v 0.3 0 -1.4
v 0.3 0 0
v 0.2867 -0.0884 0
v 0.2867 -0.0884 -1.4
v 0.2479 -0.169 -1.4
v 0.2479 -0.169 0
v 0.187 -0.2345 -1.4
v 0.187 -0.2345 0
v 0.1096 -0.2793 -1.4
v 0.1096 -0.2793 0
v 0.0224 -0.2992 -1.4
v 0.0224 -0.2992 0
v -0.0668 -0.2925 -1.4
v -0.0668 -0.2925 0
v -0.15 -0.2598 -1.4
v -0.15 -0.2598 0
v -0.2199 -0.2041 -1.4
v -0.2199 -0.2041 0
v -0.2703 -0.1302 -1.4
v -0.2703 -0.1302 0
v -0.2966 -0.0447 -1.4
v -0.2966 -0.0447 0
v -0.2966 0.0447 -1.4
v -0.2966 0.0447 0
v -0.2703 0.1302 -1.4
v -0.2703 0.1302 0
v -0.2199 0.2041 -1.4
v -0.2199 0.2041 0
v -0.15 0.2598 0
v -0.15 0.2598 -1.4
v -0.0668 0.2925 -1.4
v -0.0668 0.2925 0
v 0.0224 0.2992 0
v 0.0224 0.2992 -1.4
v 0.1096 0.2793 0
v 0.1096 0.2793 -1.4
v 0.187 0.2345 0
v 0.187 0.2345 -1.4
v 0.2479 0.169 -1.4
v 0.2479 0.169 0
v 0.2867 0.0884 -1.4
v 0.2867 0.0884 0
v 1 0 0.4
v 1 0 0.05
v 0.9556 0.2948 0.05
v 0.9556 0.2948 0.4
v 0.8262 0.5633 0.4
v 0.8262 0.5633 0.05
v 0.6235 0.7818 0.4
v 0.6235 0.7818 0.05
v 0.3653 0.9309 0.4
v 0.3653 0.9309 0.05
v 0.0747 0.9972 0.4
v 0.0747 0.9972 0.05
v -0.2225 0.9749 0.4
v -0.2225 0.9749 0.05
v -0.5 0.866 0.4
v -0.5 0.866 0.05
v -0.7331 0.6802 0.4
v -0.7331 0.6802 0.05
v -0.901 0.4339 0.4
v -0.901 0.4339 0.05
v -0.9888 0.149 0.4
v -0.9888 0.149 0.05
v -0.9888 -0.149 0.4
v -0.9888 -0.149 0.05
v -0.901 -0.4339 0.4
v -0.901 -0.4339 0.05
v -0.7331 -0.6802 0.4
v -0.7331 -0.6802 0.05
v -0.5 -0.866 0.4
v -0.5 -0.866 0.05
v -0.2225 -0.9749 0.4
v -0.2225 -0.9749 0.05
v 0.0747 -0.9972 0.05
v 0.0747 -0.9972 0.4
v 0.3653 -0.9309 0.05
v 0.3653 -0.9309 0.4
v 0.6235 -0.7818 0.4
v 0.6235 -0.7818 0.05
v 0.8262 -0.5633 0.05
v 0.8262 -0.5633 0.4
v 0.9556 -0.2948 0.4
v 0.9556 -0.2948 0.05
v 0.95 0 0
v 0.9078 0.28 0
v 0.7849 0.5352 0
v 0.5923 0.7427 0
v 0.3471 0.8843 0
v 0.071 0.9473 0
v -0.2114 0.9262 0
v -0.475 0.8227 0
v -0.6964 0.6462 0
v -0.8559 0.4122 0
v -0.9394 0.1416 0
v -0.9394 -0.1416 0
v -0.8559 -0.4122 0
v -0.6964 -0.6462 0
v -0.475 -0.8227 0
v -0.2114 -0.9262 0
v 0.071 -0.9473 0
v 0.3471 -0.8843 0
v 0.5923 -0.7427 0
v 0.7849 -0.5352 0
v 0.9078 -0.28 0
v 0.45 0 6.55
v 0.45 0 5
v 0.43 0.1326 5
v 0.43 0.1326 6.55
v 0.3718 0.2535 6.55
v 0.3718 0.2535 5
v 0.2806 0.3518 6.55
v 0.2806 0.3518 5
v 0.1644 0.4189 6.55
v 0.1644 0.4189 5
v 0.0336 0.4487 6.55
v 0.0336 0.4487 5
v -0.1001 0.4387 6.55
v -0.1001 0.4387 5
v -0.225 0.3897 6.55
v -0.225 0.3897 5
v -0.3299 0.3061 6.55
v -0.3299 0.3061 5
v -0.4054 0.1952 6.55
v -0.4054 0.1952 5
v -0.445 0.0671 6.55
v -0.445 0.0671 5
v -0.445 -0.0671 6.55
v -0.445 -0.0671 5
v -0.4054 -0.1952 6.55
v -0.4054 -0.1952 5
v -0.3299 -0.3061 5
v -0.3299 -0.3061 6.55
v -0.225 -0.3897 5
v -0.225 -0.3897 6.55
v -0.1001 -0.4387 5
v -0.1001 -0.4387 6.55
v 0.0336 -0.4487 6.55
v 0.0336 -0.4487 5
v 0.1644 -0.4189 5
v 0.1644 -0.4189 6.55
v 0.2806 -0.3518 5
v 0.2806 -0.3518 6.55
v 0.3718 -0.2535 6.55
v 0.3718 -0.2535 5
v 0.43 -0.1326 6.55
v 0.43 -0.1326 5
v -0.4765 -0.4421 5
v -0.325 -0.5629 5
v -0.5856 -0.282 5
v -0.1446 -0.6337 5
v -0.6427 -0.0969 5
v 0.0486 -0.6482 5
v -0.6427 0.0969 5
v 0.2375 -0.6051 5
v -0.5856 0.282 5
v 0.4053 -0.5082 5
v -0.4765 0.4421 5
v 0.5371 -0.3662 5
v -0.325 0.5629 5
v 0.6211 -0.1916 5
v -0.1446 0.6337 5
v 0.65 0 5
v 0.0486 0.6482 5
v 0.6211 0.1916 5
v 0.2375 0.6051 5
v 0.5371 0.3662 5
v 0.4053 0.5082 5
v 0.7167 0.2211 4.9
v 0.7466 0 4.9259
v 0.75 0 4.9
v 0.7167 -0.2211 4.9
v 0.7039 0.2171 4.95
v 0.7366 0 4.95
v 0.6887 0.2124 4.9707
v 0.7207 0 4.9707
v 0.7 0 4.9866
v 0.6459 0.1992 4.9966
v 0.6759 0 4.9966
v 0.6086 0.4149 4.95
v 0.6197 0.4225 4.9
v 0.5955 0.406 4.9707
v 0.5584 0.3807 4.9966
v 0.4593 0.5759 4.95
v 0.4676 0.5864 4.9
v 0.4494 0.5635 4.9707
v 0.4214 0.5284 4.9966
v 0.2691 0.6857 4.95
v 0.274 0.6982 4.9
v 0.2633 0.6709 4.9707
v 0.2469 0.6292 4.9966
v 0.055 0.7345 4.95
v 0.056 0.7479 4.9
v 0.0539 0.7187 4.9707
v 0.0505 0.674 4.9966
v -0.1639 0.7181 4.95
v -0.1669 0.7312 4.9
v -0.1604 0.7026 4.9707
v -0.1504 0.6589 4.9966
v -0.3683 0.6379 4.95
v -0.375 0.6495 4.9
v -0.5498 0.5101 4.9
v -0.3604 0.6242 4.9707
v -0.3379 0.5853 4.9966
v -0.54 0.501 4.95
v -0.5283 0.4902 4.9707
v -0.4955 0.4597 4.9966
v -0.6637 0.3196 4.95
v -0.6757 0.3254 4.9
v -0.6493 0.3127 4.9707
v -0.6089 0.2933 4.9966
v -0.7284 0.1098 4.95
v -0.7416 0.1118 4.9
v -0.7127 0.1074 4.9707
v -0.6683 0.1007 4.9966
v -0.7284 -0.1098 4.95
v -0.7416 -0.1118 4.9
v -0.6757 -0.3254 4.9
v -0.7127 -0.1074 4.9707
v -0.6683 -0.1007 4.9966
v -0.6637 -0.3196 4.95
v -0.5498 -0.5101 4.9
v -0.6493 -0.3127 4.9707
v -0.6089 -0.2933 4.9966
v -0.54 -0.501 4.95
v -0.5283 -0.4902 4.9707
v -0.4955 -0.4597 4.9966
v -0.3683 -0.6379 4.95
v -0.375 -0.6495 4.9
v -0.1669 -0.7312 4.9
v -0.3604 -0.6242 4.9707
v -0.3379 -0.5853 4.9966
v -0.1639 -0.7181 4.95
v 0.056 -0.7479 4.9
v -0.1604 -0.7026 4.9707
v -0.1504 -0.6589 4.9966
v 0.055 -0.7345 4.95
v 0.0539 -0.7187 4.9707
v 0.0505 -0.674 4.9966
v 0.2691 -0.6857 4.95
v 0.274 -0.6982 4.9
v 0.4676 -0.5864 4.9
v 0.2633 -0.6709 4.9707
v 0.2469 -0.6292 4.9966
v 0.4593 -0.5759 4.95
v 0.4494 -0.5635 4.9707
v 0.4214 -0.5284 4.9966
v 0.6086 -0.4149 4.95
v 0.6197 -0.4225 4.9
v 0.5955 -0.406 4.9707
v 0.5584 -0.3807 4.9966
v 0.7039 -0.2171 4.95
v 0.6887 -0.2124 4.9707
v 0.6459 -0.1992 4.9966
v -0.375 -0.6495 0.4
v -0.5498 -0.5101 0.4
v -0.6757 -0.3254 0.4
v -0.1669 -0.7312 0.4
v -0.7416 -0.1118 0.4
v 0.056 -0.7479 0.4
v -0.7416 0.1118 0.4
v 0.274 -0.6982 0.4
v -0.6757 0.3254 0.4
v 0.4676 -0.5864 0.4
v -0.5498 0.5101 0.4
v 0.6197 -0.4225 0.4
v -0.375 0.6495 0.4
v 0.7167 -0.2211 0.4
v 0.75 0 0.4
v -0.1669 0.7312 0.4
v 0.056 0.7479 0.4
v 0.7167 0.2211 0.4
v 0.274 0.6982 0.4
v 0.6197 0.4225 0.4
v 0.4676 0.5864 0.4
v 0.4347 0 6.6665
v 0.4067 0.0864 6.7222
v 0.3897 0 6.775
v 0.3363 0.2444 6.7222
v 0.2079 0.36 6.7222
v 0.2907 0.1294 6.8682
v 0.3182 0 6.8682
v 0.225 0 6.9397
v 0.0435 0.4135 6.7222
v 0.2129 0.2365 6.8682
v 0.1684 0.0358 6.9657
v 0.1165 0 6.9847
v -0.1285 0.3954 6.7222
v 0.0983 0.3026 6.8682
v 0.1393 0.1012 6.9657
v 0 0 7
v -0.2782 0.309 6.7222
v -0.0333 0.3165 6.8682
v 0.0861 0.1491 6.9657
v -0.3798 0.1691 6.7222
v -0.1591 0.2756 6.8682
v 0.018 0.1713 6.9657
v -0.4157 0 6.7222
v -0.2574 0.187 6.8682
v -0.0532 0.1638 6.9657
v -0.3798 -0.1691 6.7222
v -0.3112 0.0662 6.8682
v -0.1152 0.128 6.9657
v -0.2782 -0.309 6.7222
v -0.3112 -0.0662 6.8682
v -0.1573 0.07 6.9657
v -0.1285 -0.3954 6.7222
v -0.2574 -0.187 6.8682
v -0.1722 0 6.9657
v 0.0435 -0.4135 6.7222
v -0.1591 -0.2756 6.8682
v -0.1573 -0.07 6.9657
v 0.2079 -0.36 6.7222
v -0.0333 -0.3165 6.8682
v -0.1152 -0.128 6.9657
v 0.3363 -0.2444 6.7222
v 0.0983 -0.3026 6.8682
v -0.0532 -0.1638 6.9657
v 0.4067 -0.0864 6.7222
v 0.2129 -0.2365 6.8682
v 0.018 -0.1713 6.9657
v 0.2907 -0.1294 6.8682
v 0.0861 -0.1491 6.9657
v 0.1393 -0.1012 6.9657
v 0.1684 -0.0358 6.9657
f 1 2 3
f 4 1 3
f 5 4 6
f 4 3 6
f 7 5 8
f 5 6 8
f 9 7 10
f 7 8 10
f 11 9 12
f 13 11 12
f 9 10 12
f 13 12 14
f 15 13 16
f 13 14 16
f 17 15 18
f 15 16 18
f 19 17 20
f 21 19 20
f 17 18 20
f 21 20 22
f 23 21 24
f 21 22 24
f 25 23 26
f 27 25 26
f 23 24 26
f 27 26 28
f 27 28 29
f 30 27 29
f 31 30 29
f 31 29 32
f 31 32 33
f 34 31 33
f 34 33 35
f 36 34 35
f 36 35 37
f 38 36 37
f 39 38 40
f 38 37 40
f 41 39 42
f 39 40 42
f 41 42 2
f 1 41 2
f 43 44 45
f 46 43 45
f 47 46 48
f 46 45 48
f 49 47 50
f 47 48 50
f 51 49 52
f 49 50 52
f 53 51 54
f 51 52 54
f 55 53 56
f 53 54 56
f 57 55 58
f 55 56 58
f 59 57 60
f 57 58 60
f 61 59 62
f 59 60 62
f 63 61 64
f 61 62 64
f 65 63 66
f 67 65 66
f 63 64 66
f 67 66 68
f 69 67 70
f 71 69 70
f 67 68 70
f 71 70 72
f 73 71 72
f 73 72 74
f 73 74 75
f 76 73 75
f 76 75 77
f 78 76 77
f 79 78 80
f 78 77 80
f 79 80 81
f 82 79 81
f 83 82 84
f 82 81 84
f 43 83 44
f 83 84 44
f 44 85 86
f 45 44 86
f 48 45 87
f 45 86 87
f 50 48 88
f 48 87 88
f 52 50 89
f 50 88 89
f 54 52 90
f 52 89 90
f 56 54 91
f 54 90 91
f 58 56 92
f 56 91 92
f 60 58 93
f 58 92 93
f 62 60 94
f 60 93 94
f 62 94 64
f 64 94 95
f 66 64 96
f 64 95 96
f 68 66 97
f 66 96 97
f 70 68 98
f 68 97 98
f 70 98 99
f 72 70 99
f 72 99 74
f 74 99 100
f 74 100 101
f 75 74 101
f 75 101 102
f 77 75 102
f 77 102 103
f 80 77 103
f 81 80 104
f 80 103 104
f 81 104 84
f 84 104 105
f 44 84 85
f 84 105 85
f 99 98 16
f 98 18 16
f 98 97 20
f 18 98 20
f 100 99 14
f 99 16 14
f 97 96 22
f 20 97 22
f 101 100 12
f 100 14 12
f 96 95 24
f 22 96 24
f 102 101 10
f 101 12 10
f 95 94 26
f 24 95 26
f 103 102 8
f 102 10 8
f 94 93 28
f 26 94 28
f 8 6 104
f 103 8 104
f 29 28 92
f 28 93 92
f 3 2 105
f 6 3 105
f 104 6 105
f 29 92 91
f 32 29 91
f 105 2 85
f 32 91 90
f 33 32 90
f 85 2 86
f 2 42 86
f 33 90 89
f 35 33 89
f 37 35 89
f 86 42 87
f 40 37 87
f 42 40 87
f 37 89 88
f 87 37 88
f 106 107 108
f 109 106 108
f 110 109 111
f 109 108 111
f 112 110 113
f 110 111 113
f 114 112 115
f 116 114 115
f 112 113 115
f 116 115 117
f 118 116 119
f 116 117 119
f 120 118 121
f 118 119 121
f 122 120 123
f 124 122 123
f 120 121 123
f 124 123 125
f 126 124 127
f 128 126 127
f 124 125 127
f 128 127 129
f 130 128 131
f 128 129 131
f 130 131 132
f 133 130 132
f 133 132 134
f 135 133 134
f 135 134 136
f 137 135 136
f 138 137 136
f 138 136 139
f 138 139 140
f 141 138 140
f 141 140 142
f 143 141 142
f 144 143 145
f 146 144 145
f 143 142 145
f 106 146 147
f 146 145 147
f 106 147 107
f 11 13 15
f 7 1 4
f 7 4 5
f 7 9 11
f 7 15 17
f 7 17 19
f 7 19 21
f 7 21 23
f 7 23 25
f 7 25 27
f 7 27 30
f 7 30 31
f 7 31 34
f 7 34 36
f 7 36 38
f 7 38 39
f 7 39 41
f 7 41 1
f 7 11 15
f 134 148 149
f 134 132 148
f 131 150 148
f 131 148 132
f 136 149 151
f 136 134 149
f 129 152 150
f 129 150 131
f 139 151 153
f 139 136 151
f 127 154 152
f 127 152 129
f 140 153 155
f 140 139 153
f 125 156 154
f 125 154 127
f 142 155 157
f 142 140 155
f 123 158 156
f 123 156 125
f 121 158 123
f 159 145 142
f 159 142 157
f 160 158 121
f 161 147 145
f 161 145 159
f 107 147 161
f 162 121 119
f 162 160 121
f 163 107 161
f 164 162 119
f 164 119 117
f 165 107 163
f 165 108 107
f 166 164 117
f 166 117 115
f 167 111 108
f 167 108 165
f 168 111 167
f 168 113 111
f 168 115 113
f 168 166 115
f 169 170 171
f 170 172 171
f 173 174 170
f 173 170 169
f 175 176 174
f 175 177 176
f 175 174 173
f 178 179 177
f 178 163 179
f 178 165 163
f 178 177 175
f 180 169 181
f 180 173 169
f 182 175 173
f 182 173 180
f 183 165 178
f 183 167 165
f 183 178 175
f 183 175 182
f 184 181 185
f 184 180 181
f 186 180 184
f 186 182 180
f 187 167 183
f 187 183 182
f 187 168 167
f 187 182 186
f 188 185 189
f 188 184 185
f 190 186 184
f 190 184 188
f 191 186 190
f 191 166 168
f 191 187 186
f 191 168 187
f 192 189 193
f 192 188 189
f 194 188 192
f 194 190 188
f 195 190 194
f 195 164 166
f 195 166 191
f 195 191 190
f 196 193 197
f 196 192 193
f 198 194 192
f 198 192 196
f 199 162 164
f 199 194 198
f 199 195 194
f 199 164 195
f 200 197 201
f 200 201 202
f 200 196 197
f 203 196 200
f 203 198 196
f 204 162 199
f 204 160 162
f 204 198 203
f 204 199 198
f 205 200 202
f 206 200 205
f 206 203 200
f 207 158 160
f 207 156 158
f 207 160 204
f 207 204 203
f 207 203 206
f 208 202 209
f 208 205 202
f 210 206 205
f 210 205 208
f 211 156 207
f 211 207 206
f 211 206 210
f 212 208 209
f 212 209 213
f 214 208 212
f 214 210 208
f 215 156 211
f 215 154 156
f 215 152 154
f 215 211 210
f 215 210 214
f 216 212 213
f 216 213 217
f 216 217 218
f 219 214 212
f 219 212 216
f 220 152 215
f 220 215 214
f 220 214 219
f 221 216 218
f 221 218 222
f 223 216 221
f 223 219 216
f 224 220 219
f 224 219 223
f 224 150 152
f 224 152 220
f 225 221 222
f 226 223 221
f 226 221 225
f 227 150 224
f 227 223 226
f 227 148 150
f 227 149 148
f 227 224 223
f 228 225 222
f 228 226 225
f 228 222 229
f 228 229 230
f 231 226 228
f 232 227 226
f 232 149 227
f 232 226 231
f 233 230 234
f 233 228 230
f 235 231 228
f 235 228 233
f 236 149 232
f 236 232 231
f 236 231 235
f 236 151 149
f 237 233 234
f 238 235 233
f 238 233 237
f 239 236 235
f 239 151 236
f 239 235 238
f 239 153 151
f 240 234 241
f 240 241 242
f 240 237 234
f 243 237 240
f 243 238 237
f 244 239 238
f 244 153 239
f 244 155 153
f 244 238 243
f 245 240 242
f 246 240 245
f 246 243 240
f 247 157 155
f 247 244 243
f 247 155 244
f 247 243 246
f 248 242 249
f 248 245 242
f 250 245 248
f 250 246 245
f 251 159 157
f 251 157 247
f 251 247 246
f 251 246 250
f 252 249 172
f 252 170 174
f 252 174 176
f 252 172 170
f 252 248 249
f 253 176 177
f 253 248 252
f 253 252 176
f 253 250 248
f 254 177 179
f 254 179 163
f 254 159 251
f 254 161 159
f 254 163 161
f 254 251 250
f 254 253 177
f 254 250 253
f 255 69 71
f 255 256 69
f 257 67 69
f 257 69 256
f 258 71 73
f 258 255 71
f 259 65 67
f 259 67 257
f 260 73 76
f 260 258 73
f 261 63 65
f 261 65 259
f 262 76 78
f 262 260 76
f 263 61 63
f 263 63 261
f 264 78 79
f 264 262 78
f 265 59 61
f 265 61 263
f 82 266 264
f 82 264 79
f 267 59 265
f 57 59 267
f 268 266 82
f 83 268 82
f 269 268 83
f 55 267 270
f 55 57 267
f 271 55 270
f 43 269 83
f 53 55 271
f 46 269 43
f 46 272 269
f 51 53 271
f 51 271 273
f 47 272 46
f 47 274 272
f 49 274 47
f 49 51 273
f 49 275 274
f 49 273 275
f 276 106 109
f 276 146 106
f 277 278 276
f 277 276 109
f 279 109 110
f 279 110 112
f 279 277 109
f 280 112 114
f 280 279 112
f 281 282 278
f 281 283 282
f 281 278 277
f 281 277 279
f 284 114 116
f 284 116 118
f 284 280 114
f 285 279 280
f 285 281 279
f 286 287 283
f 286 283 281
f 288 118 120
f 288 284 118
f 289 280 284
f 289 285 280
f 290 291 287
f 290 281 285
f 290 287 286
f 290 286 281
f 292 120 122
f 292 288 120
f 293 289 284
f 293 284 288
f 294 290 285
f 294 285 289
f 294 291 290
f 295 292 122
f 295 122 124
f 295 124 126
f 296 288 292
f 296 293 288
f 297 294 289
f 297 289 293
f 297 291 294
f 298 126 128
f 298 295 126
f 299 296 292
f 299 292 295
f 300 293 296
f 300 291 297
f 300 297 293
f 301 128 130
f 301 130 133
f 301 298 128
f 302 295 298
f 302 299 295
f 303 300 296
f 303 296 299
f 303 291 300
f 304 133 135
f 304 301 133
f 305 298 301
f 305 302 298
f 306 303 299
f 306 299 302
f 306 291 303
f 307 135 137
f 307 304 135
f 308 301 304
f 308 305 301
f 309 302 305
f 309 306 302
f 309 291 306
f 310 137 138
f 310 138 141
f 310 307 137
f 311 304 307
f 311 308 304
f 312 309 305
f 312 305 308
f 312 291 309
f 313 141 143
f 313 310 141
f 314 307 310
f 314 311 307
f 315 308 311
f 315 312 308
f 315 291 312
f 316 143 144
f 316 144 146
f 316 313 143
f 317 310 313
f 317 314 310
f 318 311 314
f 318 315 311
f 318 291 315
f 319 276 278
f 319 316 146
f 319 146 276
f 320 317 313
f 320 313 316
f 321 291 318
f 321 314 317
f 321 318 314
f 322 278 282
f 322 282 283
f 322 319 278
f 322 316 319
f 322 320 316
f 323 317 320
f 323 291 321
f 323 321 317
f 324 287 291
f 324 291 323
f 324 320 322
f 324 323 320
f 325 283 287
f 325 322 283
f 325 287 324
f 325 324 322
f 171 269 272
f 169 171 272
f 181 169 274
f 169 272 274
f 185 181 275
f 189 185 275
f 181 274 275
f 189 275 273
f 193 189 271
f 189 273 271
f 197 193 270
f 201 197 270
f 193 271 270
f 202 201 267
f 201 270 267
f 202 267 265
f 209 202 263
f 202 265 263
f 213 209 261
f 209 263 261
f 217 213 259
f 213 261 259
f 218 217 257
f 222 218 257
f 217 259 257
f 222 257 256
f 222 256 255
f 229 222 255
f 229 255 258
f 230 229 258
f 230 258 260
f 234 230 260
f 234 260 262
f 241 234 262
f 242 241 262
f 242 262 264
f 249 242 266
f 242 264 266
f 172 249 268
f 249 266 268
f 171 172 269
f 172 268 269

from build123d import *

# Parameters (mm, degrees)
SKETCH_R     = 1
PAD_DEPTH    = 0.4
SKETCH001_R  = 0.75
PAD001_DEPTH = 4.6
SKETCH002_R  = 0.45
PAD002_DEPTH = 2
SKETCH003_R  = 0.3
PAD003_DEPTH = 1.4
CHAMFER_SIZE = 0.05
FILLET_R     = 0.1
FILLET001_R  = 0.45


with BuildPart() as part:
    # Sketch → Pad (new body)
    with BuildSketch(Plane.XY):
        Circle(SKETCH_R)
    extrude(amount=PAD_DEPTH)

    # Sketch001 (on Face3 of Pad) → Pad001 (join)
    with BuildSketch(Plane.XY.offset(0.4)):
        Circle(SKETCH001_R)
    extrude(amount=PAD001_DEPTH)

    # Sketch002 (on Face5 of Pad001) → Pad002 (join)
    with BuildSketch(Plane.XY.offset(5)):
        Circle(SKETCH002_R)
    extrude(amount=PAD002_DEPTH)

    # Sketch003 (on Face2 of Pad002) → Pad003 (join)
    with BuildSketch(Plane(origin=(0, 0, 0), x_dir=(1, 0, 0), z_dir=(0, 0, -1))):
        Circle(SKETCH003_R)
    extrude(amount=PAD003_DEPTH)

    # Chamfer
    chamfer_edges = [part.edges().sort_by_distance(p)[0] for p in [
        (-1, 0, 0),
    ]]
    chamfer(chamfer_edges, length=CHAMFER_SIZE)

    # Fillet
    fillet_edges = [part.edges().sort_by_distance(p)[0] for p in [
        (-0.75, 0, 5),
    ]]
    fillet(fillet_edges, radius=FILLET_R)

    # Fillet001
    fillet001_edges = [part.edges().sort_by_distance(p)[0] for p in [
        (-0.45, 0, 7),
    ]]
    fillet(fillet001_edges, radius=FILLET001_R)


solid = part.part
